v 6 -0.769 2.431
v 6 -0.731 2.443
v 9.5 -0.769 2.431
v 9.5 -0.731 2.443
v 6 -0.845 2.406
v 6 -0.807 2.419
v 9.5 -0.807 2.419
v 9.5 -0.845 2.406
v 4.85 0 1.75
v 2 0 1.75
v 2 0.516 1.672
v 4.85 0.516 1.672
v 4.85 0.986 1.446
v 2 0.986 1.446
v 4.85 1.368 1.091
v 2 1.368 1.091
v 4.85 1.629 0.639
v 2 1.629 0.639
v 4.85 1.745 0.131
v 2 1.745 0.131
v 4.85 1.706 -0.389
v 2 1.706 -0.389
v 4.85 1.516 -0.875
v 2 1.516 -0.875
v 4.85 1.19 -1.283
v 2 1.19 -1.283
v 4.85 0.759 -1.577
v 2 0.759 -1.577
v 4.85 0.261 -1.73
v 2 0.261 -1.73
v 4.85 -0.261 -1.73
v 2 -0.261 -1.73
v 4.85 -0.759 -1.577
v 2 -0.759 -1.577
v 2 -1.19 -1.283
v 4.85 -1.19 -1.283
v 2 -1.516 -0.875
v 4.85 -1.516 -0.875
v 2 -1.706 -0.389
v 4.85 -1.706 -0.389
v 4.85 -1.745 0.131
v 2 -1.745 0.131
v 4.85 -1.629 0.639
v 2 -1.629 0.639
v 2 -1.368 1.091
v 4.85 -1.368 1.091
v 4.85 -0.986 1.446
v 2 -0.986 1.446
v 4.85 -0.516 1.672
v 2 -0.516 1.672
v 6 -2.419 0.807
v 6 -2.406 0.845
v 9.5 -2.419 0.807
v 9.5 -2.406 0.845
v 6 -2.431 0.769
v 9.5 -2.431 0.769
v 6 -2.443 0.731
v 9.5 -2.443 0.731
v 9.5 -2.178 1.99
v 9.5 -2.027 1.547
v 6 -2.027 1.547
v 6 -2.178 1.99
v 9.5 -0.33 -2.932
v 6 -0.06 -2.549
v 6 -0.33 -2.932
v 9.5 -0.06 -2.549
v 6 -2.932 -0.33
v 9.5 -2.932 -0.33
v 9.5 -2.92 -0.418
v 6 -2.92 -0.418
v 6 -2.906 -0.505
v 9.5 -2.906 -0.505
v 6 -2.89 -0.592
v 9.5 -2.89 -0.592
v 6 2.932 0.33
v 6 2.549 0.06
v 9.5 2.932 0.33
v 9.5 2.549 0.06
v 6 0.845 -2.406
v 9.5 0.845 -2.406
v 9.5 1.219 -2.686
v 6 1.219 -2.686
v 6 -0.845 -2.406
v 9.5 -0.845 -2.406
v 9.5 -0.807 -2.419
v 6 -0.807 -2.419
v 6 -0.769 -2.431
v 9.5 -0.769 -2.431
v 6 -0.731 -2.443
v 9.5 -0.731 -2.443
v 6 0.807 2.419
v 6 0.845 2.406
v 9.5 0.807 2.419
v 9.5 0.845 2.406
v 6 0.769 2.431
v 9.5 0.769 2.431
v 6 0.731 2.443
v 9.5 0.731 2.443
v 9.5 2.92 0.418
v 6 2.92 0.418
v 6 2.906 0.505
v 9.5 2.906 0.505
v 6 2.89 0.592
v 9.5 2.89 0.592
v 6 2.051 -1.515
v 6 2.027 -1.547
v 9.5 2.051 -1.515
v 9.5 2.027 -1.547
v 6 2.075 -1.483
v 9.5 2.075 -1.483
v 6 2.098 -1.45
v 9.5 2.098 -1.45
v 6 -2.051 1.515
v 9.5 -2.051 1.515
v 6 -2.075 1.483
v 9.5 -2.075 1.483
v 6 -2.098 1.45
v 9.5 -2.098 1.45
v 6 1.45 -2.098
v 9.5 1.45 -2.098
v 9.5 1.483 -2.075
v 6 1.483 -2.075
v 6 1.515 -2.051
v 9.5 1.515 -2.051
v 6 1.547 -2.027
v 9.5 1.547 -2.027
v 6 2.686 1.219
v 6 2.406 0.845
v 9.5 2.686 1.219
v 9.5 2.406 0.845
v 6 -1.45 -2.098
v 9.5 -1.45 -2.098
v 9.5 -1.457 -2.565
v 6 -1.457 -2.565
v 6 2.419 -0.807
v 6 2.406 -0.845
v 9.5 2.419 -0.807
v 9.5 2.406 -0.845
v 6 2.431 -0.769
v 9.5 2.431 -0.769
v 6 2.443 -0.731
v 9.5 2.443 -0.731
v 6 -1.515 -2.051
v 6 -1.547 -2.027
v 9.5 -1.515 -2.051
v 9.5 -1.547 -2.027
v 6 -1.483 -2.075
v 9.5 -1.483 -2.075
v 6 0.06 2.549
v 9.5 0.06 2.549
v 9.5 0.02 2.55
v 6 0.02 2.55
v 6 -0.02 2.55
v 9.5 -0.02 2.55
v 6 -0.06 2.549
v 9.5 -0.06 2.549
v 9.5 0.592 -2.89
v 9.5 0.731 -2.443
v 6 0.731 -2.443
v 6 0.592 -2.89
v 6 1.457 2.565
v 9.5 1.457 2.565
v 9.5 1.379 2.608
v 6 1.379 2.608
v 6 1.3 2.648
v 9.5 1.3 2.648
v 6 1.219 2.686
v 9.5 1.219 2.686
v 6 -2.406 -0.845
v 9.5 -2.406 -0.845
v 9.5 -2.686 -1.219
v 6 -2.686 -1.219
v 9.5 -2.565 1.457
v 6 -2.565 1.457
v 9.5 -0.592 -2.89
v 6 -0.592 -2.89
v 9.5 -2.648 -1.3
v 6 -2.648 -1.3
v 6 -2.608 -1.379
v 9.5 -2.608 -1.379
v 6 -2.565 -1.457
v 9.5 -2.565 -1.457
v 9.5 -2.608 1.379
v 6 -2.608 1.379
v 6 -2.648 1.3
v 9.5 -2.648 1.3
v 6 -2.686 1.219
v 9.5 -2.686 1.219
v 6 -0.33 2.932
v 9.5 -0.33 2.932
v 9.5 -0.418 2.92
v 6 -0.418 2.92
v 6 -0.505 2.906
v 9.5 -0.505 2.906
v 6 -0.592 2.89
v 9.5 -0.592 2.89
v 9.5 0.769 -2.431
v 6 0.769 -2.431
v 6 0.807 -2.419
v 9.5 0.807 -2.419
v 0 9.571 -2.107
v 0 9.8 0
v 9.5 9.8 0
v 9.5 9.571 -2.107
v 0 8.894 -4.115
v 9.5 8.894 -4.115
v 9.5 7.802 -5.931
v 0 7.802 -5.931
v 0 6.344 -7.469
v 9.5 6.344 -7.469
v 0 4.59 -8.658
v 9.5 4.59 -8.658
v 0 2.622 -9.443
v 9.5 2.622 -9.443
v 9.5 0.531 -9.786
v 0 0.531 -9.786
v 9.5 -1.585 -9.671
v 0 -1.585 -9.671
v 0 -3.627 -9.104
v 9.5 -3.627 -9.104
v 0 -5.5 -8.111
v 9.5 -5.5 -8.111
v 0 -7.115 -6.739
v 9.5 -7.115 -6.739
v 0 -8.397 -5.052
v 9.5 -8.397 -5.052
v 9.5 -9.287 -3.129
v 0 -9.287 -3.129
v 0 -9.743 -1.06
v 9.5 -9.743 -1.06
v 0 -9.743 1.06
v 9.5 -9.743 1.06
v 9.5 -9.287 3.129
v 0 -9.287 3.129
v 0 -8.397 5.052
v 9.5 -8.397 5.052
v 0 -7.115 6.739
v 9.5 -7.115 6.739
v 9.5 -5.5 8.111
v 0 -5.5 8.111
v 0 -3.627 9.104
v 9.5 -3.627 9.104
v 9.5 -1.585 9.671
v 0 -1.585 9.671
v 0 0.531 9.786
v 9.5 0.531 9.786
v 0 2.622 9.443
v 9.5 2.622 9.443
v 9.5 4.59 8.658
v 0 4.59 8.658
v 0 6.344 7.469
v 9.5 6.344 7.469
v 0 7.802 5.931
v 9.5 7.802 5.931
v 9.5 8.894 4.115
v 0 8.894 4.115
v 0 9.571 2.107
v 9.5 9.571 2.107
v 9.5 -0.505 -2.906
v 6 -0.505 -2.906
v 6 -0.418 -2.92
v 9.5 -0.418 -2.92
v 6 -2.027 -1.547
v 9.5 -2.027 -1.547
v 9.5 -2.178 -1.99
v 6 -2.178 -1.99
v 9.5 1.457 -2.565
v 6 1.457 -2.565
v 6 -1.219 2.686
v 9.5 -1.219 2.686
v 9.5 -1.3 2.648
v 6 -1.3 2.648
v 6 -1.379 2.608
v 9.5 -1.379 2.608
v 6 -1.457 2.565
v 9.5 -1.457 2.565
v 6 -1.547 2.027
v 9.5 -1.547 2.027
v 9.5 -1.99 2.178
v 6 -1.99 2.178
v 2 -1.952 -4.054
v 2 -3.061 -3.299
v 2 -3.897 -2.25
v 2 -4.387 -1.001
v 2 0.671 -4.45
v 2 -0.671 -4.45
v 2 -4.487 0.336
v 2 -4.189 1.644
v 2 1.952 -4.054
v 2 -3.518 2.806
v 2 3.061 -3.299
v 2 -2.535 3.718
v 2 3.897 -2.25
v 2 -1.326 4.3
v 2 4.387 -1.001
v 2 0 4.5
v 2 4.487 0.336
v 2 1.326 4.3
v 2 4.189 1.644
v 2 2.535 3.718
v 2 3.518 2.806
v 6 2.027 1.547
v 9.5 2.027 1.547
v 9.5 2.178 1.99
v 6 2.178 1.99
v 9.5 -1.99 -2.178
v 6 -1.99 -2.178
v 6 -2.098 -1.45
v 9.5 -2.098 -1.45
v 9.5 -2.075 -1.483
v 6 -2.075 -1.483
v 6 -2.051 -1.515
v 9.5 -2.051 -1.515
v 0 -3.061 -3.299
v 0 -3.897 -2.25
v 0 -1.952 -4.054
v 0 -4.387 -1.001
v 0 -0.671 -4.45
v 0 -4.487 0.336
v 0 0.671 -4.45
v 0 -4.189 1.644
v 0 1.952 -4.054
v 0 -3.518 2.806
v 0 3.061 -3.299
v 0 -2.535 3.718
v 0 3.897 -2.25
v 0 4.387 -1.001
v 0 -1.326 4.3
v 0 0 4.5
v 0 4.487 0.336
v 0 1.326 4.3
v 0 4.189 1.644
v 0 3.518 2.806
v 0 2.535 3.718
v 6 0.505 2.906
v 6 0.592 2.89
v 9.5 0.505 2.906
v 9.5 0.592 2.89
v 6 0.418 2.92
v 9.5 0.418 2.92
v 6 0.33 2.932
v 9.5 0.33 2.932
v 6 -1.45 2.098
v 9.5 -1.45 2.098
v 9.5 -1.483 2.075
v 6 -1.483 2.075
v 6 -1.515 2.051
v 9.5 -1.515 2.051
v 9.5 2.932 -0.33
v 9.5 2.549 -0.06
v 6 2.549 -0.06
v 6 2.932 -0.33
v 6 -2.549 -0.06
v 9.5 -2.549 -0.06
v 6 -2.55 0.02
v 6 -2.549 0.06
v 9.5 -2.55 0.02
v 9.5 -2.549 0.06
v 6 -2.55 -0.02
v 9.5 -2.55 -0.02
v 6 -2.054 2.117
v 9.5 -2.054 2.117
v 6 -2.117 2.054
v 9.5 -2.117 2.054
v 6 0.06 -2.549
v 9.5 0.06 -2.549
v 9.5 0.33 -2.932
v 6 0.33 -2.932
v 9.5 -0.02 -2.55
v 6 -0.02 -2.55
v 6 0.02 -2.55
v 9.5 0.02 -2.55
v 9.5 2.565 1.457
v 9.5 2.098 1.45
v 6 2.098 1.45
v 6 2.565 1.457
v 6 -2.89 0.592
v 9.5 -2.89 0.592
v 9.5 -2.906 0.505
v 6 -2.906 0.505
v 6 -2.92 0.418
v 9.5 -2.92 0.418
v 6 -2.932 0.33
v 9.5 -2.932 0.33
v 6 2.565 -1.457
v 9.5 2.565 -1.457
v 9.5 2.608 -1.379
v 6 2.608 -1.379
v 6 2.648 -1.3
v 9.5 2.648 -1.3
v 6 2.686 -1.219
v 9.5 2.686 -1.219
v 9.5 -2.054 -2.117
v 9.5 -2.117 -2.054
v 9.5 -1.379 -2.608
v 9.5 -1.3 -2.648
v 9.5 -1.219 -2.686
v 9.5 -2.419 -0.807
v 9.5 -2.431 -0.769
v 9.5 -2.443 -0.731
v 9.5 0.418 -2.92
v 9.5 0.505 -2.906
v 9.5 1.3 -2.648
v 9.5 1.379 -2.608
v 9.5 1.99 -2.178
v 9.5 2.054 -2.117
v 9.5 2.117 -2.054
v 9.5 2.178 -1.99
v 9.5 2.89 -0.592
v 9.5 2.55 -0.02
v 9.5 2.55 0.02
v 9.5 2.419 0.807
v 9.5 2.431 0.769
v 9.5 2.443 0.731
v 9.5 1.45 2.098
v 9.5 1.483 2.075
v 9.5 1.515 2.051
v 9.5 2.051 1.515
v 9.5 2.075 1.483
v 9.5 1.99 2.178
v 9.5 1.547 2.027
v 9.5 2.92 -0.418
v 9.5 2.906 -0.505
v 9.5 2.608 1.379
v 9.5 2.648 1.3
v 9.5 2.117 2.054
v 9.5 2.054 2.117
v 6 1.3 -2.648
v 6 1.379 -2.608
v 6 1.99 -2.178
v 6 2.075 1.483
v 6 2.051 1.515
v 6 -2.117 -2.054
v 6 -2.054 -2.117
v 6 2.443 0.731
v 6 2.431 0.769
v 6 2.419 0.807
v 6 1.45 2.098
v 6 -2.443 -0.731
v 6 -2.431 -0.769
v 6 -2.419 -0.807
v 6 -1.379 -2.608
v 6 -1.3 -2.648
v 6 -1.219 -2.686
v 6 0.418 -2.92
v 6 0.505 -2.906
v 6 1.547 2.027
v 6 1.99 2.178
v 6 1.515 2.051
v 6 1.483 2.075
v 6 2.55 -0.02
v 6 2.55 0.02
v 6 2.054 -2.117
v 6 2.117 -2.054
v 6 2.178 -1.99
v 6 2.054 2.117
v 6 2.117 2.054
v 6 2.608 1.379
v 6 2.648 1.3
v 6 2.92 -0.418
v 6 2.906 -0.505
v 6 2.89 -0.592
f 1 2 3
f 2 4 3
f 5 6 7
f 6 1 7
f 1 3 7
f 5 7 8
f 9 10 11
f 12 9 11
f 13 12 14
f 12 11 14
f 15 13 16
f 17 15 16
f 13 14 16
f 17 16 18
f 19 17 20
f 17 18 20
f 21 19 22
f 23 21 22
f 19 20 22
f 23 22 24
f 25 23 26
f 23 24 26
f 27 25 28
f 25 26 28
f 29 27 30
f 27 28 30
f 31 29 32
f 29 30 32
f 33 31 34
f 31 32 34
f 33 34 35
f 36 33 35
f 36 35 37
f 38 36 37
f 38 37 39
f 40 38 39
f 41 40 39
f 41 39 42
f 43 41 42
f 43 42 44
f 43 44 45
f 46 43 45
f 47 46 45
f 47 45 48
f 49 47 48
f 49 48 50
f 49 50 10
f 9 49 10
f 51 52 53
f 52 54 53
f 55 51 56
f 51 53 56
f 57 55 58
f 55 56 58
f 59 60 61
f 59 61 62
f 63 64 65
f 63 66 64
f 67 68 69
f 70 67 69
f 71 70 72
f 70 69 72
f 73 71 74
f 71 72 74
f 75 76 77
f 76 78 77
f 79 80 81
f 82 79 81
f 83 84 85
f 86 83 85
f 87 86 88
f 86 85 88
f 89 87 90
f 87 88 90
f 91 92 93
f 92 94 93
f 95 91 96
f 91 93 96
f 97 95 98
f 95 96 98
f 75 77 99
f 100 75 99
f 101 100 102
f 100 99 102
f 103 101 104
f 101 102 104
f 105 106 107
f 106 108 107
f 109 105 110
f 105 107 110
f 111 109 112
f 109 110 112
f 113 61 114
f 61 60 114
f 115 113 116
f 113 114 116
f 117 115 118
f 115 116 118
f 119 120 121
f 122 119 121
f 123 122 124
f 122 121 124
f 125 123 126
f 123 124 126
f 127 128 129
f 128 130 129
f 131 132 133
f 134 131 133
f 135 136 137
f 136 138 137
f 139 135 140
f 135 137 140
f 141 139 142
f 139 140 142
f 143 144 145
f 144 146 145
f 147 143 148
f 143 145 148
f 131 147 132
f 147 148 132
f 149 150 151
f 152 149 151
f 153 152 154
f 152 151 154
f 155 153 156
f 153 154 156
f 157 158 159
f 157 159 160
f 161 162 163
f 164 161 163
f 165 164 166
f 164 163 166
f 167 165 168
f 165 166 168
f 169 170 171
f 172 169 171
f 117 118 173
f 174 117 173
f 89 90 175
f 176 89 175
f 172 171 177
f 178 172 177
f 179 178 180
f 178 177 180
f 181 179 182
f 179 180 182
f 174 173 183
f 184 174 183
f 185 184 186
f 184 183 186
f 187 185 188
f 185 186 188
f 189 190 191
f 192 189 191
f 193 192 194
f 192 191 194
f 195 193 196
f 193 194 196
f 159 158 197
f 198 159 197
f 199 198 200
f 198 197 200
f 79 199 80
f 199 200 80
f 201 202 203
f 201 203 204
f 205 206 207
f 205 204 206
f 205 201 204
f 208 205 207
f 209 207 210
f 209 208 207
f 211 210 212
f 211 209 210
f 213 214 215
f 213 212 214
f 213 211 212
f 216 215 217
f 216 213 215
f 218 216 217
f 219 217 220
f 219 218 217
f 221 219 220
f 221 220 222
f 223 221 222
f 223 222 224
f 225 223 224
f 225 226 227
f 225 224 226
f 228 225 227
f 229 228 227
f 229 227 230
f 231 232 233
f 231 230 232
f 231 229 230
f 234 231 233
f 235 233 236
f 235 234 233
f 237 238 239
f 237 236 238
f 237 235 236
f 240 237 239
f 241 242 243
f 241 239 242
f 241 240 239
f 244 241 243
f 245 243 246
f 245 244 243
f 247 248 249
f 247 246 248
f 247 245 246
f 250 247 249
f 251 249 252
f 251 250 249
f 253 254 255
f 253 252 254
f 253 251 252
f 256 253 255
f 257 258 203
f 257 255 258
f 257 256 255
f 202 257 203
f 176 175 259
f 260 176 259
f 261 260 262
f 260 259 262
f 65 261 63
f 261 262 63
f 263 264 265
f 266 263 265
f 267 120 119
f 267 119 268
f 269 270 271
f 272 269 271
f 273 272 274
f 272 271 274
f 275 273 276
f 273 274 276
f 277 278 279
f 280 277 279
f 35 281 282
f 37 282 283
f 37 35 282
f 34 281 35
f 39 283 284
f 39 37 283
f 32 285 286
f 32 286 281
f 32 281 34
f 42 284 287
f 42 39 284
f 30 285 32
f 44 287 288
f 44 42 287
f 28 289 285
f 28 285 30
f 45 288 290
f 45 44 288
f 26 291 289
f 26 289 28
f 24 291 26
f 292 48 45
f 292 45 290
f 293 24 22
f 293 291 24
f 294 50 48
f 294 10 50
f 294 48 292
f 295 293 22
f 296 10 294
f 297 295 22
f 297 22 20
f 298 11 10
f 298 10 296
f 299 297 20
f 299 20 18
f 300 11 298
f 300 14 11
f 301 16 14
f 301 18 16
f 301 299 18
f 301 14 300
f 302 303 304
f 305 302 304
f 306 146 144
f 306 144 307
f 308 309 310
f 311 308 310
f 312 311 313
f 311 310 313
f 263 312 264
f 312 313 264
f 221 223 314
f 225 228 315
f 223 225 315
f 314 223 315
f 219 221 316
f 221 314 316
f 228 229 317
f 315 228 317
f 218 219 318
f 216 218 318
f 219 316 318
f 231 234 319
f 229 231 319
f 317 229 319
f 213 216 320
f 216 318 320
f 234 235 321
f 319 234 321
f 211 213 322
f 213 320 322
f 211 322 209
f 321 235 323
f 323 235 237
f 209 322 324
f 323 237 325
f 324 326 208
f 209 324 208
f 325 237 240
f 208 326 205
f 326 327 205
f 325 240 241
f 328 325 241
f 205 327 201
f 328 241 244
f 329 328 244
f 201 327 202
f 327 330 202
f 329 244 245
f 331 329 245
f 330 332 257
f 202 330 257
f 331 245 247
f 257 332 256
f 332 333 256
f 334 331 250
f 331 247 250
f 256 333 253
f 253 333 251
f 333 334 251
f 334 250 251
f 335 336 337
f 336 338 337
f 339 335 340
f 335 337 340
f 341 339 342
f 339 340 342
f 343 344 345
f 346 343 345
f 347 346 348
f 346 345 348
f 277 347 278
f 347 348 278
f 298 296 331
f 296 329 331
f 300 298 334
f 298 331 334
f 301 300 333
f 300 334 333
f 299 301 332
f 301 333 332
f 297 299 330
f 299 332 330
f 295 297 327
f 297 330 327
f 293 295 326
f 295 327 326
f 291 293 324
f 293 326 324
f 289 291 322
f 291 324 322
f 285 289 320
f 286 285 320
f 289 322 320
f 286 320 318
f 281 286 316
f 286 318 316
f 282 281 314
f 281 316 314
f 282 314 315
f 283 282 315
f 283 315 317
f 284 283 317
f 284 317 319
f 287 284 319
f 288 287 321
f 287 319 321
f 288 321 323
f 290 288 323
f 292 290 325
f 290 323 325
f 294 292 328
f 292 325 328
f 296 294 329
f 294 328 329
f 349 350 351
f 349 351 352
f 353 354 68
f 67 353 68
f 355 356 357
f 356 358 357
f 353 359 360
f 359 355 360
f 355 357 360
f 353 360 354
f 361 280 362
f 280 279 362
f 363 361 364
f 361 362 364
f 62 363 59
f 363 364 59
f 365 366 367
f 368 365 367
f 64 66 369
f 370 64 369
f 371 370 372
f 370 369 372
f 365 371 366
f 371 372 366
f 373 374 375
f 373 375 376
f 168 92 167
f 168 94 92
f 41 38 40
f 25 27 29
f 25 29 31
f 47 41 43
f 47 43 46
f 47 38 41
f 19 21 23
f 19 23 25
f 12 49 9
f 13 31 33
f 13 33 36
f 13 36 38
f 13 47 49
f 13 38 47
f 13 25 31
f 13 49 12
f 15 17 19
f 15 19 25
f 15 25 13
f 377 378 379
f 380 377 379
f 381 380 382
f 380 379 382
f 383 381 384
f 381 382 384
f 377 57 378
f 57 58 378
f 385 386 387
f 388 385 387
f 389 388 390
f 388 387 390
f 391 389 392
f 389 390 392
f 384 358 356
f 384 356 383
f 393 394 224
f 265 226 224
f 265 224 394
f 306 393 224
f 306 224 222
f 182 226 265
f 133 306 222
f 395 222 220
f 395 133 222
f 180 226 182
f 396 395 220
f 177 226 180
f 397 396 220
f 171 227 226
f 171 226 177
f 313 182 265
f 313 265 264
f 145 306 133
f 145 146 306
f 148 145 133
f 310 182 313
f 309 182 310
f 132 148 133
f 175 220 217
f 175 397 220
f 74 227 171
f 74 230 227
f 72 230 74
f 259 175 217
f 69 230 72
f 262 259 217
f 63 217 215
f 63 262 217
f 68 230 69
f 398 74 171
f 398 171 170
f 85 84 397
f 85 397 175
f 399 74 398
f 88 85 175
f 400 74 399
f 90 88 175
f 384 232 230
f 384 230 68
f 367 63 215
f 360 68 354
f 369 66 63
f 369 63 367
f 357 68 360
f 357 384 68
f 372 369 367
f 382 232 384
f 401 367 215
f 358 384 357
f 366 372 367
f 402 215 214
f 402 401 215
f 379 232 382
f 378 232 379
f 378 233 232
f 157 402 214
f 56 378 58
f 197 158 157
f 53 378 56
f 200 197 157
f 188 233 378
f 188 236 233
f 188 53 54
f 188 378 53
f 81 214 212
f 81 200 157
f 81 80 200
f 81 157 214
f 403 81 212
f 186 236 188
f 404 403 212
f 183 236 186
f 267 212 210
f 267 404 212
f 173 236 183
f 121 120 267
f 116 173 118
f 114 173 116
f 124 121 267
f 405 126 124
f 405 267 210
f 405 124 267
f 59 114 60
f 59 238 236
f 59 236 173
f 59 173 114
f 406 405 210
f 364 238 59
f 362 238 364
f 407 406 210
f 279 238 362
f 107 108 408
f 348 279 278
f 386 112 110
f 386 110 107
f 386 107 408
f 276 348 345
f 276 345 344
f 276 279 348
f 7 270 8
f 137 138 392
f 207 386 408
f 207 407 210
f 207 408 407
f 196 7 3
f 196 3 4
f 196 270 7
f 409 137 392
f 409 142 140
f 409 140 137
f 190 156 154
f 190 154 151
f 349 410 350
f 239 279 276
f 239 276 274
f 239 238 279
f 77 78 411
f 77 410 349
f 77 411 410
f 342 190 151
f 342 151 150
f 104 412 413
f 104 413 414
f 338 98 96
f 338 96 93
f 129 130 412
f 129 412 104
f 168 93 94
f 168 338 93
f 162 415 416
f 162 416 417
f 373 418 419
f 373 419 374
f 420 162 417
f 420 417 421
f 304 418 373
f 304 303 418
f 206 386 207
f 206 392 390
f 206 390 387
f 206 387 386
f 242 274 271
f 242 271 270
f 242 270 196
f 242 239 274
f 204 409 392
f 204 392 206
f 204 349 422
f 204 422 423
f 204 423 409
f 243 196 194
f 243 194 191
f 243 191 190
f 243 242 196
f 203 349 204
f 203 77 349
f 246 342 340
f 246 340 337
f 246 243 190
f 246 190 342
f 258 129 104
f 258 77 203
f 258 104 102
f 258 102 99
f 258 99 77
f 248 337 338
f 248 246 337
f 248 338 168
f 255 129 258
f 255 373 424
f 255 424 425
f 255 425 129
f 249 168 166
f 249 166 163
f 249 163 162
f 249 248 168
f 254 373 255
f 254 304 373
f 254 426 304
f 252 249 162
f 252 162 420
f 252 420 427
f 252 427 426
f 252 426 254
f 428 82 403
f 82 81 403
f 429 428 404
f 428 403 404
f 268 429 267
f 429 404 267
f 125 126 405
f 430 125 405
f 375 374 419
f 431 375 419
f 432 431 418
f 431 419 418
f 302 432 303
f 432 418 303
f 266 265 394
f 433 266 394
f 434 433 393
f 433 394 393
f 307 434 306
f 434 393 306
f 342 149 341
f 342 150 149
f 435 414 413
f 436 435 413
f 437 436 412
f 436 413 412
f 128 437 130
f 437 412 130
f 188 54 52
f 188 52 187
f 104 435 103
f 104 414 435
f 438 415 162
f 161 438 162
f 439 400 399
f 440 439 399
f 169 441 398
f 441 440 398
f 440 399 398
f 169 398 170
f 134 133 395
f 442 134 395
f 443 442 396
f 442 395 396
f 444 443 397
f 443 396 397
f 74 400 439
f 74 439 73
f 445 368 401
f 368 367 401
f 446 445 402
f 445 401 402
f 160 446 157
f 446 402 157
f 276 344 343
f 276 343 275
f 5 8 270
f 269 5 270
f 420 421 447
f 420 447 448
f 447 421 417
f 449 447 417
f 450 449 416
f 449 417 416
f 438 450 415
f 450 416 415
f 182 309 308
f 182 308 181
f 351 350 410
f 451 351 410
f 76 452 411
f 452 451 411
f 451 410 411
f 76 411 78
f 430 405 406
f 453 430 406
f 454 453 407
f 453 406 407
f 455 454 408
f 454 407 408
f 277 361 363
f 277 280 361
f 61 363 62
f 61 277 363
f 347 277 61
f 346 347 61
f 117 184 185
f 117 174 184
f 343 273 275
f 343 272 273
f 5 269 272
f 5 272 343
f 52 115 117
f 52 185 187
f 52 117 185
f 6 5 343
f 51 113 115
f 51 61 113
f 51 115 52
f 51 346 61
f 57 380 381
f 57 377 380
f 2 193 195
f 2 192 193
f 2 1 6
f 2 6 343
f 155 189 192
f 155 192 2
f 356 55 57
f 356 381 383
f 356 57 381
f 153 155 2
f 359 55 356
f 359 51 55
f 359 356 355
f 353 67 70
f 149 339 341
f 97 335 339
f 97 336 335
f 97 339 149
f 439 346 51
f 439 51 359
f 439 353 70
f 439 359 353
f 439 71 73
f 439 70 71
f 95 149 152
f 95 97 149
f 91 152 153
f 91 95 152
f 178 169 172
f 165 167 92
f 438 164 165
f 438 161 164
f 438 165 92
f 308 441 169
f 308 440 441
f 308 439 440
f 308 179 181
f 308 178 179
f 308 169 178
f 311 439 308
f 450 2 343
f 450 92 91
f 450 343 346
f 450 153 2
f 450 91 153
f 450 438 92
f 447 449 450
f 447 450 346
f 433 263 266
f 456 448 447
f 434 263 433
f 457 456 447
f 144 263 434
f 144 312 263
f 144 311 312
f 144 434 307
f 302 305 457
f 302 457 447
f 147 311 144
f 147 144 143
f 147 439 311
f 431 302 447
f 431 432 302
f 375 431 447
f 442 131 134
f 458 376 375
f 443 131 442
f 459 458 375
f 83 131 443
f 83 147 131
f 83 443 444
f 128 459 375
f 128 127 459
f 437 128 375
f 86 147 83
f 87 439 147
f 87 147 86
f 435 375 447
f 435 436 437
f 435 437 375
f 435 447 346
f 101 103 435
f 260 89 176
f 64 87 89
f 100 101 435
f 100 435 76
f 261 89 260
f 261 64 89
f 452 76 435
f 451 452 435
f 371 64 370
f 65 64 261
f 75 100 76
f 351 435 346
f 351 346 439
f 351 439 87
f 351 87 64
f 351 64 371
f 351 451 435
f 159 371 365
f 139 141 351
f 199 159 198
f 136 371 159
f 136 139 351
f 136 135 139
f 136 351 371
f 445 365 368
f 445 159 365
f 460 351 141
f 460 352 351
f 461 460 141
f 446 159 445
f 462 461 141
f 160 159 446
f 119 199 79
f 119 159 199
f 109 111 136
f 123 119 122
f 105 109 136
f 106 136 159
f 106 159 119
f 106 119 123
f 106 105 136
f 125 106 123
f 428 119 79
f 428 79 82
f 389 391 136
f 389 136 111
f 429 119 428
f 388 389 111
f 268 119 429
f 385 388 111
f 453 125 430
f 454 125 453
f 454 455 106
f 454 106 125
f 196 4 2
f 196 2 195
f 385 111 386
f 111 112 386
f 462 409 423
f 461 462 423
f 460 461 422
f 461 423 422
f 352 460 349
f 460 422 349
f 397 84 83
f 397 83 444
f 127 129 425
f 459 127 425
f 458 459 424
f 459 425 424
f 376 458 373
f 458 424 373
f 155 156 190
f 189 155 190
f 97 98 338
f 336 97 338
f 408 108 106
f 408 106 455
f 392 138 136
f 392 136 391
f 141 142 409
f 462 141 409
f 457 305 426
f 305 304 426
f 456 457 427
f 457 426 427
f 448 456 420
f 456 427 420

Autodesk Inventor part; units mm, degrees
ref_plane "YZ Plane" through (0, 0, 0) normal (1, 0, 0) x (0, 1, 0)
ref_plane "XZ Plane" through (0, 0, 0) normal (0, 1, 0) x (-1, 0, 0)
ref_plane "XY Plane" through (0, 0, 0) normal (0, 0, 1) x (1, 0, 0)
sketch "Esboço2" plane through (0, 0, 0) normal (0, 0, 1) x (1, 0, 0)
  line L0 (0, 0) -> (9.5, 0)
  line L1 (9.5, 0) -> (9.5, 9.8)
  line L2 (9.5, 9.8) -> (0, 9.8)
  line L3 (0, 9.8) -> (0, 0)
  dimension "d0" = 9.5
  dimension "d1" = 9.8
revolve "Revolução1" add sketch "Esboço2" angle 360 about axis through (0, 0, 0) along (1, 0, 0)
sketch "Esboço3" plane through (0, 0, 0) normal (-1, 0, 0) x (0, 0, 1)
  circle A0 centre (0, 0) radius 1.75
  dimension "d3" = 3.5
extrude "Extrusão1" cut sketch "Esboço3" against normal blind 4.85
sketch "Esboço4" plane through (0, 0, 0) normal (-1, 0, 0) x (0, 0, 1)
  circle A0 centre (0, 0) radius 4.5
  dimension "d6" = 9
extrude "Extrusão2" cut sketch "Esboço4" against normal blind 2
sketch "Esboço11" plane through (9.5, 0, 0) normal (1, 0, 0) x (0, 0, -1)
  circle A0 centre (0, 0) radius 2.55
  circle A1 centre (0, 0) radius 2.95
  line L0 (0, 0) -> (2.95, 0)
  line L1 (2.55, 0) -> (2.5493, 0.06)
  line L2 (2.5493, 0.06) -> (2.55, 0)
  line L3 (2.55, 0) -> (2.5493, -0.06)
  line L4 (2.5493, 0.06) -> (2.9315, 0.3295)
  line L5 (2.5493, -0.06) -> (2.9315, -0.3295)
  line L6 (2.9315, 0.3295) -> (2.9255, 0.3791)
  line L7 (2.9315, -0.3295) -> (2.9255, -0.3791)
  line L8 (2.406, 0.8448) -> (2.6862, 1.2193)
  line L9 (2.4252, 0.788) -> (2.406, 0.8448)
  line L10 (2.4252, 0.788) -> (2.4431, 0.7307)
  line L11 (2.4431, 0.7307) -> (2.8899, 0.5925)
  circle A2 centre (0, 0) radius 2.95
  line L12 (2.6862, 1.2193) -> (2.6652, 1.2646)
  line L13 (2.8899, 0.5925) -> (2.8995, 0.5435)
  line L14 (2.0272, 1.547) -> (2.178, 1.9897)
  line L15 (2.063, 1.4989) -> (2.0272, 1.547)
  line L16 (2.063, 1.4989) -> (2.0977, 1.4499)
  line L17 (2.0977, 1.4499) -> (2.5653, 1.4566)
  circle A3 centre (0, 0) radius 2.95
  line L18 (2.178, 1.9897) -> (2.144, 2.0263)
  line L19 (2.5653, 1.4566) -> (2.5897, 1.4129)
  line L20 (1.4499, 2.0977) -> (1.4566, 2.5653)
  line L21 (1.4989, 2.063) -> (1.4499, 2.0977)
  line L22 (1.4989, 2.063) -> (1.547, 2.0272)
  line L23 (1.547, 2.0272) -> (1.9897, 2.178)
  circle A4 centre (0, 0) radius 2.95
  line L24 (1.4566, 2.5653) -> (1.4129, 2.5897)
  line L25 (1.9897, 2.178) -> (2.0263, 2.144)
  line L26 (0.7307, 2.4431) -> (0.5925, 2.8899)
  line L27 (0.788, 2.4252) -> (0.7307, 2.4431)
  line L28 (0.788, 2.4252) -> (0.8448, 2.406)
  line L29 (0.8448, 2.406) -> (1.2193, 2.6862)
  circle A5 centre (0, 0) radius 2.95
  line L30 (0.5925, 2.8899) -> (0.5435, 2.8995)
  line L31 (1.2193, 2.6862) -> (1.2646, 2.6652)
  line L32 (-0.06, 2.5493) -> (-0.3295, 2.9315)
  line L33 (0, 2.55) -> (-0.06, 2.5493)
  line L34 (0, 2.55) -> (0.06, 2.5493)
  line L35 (0.06, 2.5493) -> (0.3295, 2.9315)
  circle A6 centre (0, 0) radius 2.95
  line L36 (-0.3295, 2.9315) -> (-0.3791, 2.9255)
  line L37 (0.3295, 2.9315) -> (0.3791, 2.9255)
  line L38 (-0.8448, 2.406) -> (-1.2193, 2.6862)
  line L39 (-0.788, 2.4252) -> (-0.8448, 2.406)
  line L40 (-0.788, 2.4252) -> (-0.7307, 2.4431)
  line L41 (-0.7307, 2.4431) -> (-0.5925, 2.8899)
  circle A7 centre (0, 0) radius 2.95
  line L42 (-1.2193, 2.6862) -> (-1.2646, 2.6652)
  line L43 (-0.5925, 2.8899) -> (-0.5435, 2.8995)
  line L44 (-1.547, 2.0272) -> (-1.9897, 2.178)
  line L45 (-1.4989, 2.063) -> (-1.547, 2.0272)
  line L46 (-1.4989, 2.063) -> (-1.4499, 2.0977)
  line L47 (-1.4499, 2.0977) -> (-1.4566, 2.5653)
  circle A8 centre (0, 0) radius 2.95
  line L48 (-1.9897, 2.178) -> (-2.0263, 2.144)
  line L49 (-1.4566, 2.5653) -> (-1.4129, 2.5897)
  line L50 (-2.0977, 1.4499) -> (-2.5653, 1.4566)
  line L51 (-2.063, 1.4989) -> (-2.0977, 1.4499)
  line L52 (-2.063, 1.4989) -> (-2.0272, 1.547)
  line L53 (-2.0272, 1.547) -> (-2.178, 1.9897)
  circle A9 centre (0, 0) radius 2.95
  line L54 (-2.5653, 1.4566) -> (-2.5897, 1.4129)
  line L55 (-2.178, 1.9897) -> (-2.144, 2.0263)
  line L56 (-2.4431, 0.7307) -> (-2.8899, 0.5925)
  line L57 (-2.4252, 0.788) -> (-2.4431, 0.7307)
  line L58 (-2.4252, 0.788) -> (-2.406, 0.8448)
  line L59 (-2.406, 0.8448) -> (-2.6862, 1.2193)
  circle A10 centre (0, 0) radius 2.95
  line L60 (-2.8899, 0.5925) -> (-2.8995, 0.5435)
  line L61 (-2.6862, 1.2193) -> (-2.6652, 1.2646)
  line L62 (-2.5493, -0.06) -> (-2.9315, -0.3295)
  line L63 (-2.55, 0) -> (-2.5493, -0.06)
  line L64 (-2.55, 0) -> (-2.5493, 0.06)
  line L65 (-2.5493, 0.06) -> (-2.9315, 0.3295)
  circle A11 centre (0, 0) radius 2.95
  line L66 (-2.9315, -0.3295) -> (-2.9255, -0.3791)
  line L67 (-2.9315, 0.3295) -> (-2.9255, 0.3791)
  line L68 (-2.406, -0.8448) -> (-2.6862, -1.2193)
  line L69 (-2.4252, -0.788) -> (-2.406, -0.8448)
  line L70 (-2.4252, -0.788) -> (-2.4431, -0.7307)
  line L71 (-2.4431, -0.7307) -> (-2.8899, -0.5925)
  circle A12 centre (0, 0) radius 2.95
  line L72 (-2.6862, -1.2193) -> (-2.6652, -1.2646)
  line L73 (-2.8899, -0.5925) -> (-2.8995, -0.5435)
  line L74 (-2.0272, -1.547) -> (-2.178, -1.9897)
  line L75 (-2.063, -1.4989) -> (-2.0272, -1.547)
  line L76 (-2.063, -1.4989) -> (-2.0977, -1.4499)
  line L77 (-2.0977, -1.4499) -> (-2.5653, -1.4566)
  circle A13 centre (0, 0) radius 2.95
  line L78 (-2.178, -1.9897) -> (-2.144, -2.0263)
  line L79 (-2.5653, -1.4566) -> (-2.5897, -1.4129)
  line L80 (-1.4499, -2.0977) -> (-1.4566, -2.5653)
  line L81 (-1.4989, -2.063) -> (-1.4499, -2.0977)
  line L82 (-1.4989, -2.063) -> (-1.547, -2.0272)
  line L83 (-1.547, -2.0272) -> (-1.9897, -2.178)
  circle A14 centre (0, 0) radius 2.95
  line L84 (-1.4566, -2.5653) -> (-1.4129, -2.5897)
  line L85 (-1.9897, -2.178) -> (-2.0263, -2.144)
  line L86 (-0.7307, -2.4431) -> (-0.5925, -2.8899)
  line L87 (-0.788, -2.4252) -> (-0.7307, -2.4431)
  line L88 (-0.788, -2.4252) -> (-0.8448, -2.406)
  line L89 (-0.8448, -2.406) -> (-1.2193, -2.6862)
  circle A15 centre (0, 0) radius 2.95
  line L90 (-0.5925, -2.8899) -> (-0.5435, -2.8995)
  line L91 (-1.2193, -2.6862) -> (-1.2646, -2.6652)
  line L92 (0.06, -2.5493) -> (0.3295, -2.9315)
  line L93 (0, -2.55) -> (0.06, -2.5493)
  line L94 (0, -2.55) -> (-0.06, -2.5493)
  line L95 (-0.06, -2.5493) -> (-0.3295, -2.9315)
  circle A16 centre (0, 0) radius 2.95
  line L96 (0.3295, -2.9315) -> (0.3791, -2.9255)
  line L97 (-0.3295, -2.9315) -> (-0.3791, -2.9255)
  line L98 (0.8448, -2.406) -> (1.2193, -2.6862)
  line L99 (0.788, -2.4252) -> (0.8448, -2.406)
  line L100 (0.788, -2.4252) -> (0.7307, -2.4431)
  line L101 (0.7307, -2.4431) -> (0.5925, -2.8899)
  circle A17 centre (0, 0) radius 2.95
  line L102 (1.2193, -2.6862) -> (1.2646, -2.6652)
  line L103 (0.5925, -2.8899) -> (0.5435, -2.8995)
  line L104 (1.547, -2.0272) -> (1.9897, -2.178)
  line L105 (1.4989, -2.063) -> (1.547, -2.0272)
  line L106 (1.4989, -2.063) -> (1.4499, -2.0977)
  line L107 (1.4499, -2.0977) -> (1.4566, -2.5653)
  circle A18 centre (0, 0) radius 2.95
  line L108 (1.9897, -2.178) -> (2.0263, -2.144)
  line L109 (1.4566, -2.5653) -> (1.4129, -2.5897)
  line L110 (2.0977, -1.4499) -> (2.5653, -1.4566)
  line L111 (2.063, -1.4989) -> (2.0977, -1.4499)
  line L112 (2.063, -1.4989) -> (2.0272, -1.547)
  line L113 (2.0272, -1.547) -> (2.178, -1.9897)
  circle A19 centre (0, 0) radius 2.95
  line L114 (2.5653, -1.4566) -> (2.5897, -1.4129)
  line L115 (2.178, -1.9897) -> (2.144, -2.0263)
  line L116 (2.4431, -0.7307) -> (2.8899, -0.5925)
  line L117 (2.4252, -0.788) -> (2.4431, -0.7307)
  line L118 (2.4252, -0.788) -> (2.406, -0.8448)
  line L119 (2.406, -0.8448) -> (2.6862, -1.2193)
  circle A20 centre (0, 0) radius 2.95
  line L120 (2.8899, -0.5925) -> (2.8995, -0.5435)
  line L121 (2.6862, -1.2193) -> (2.6652, -1.2646)
  point P0 (2.8056, 0.9116)
  point P1 (2.3866, 1.734)
  point P2 (1.734, 2.3866)
  point P3 (0.9116, 2.8056)
  point P4 (0, 2.95)
  point P5 (-0.9116, 2.8056)
  point P6 (-1.734, 2.3866)
  point P7 (-2.3866, 1.734)
  point P8 (-2.8056, 0.9116)
  point P9 (-2.95, 0)
  point P10 (-2.8056, -0.9116)
  point P11 (-2.3866, -1.734)
  point P12 (-1.734, -2.3866)
  point P13 (-0.9116, -2.8056)
  point P14 (0, -2.95)
  point P15 (0.9116, -2.8056)
  point P16 (1.734, -2.3866)
  point P17 (2.3866, -1.734)
  point P18 (2.8056, -0.9116)
  dimension "d59" = 5.9
  dimension "d58" = 5.1
  dimension "d60" = 0.06
  dimension "d61" = 0.06
  dimension "d62" = 0.05
  dimension "d63" = 0.05
  dimension "d66" = 360
extrude "Extrusão5" cut sketch "Esboço11" against normal blind 3.5 contours A0 | A0 L11 A1 L4 | L5 A1 L116 A0 | A0 L17 A1 L8 | L119 A1 L110 A0 | A0 L23 A1 L14 | L113 A1 L104 A0 | A0 L29 A1 L20 | L107 A1 L98 A0 | A0 L35 A1 L26 | L101 A1 L92 A0 | A0 L41 A1 L32 | L95 A1 L86 A0 | A0 L47 A1 L38 | L89 A1 L80 A0 | A0 L53 A1 L44 | L83 A1 L74 A0 | A0 L59 A1 L50 | L77 A1 L68 A0 | A0 L65 A1 L56 | L71 A1 L62 A0
sketch "Esboço12" plane through (9.5, 0, 0) normal (1, 0, 0) x (0, 0, -1)
  point P0 (0, 0)
properties part number "roda certa 2.0"
